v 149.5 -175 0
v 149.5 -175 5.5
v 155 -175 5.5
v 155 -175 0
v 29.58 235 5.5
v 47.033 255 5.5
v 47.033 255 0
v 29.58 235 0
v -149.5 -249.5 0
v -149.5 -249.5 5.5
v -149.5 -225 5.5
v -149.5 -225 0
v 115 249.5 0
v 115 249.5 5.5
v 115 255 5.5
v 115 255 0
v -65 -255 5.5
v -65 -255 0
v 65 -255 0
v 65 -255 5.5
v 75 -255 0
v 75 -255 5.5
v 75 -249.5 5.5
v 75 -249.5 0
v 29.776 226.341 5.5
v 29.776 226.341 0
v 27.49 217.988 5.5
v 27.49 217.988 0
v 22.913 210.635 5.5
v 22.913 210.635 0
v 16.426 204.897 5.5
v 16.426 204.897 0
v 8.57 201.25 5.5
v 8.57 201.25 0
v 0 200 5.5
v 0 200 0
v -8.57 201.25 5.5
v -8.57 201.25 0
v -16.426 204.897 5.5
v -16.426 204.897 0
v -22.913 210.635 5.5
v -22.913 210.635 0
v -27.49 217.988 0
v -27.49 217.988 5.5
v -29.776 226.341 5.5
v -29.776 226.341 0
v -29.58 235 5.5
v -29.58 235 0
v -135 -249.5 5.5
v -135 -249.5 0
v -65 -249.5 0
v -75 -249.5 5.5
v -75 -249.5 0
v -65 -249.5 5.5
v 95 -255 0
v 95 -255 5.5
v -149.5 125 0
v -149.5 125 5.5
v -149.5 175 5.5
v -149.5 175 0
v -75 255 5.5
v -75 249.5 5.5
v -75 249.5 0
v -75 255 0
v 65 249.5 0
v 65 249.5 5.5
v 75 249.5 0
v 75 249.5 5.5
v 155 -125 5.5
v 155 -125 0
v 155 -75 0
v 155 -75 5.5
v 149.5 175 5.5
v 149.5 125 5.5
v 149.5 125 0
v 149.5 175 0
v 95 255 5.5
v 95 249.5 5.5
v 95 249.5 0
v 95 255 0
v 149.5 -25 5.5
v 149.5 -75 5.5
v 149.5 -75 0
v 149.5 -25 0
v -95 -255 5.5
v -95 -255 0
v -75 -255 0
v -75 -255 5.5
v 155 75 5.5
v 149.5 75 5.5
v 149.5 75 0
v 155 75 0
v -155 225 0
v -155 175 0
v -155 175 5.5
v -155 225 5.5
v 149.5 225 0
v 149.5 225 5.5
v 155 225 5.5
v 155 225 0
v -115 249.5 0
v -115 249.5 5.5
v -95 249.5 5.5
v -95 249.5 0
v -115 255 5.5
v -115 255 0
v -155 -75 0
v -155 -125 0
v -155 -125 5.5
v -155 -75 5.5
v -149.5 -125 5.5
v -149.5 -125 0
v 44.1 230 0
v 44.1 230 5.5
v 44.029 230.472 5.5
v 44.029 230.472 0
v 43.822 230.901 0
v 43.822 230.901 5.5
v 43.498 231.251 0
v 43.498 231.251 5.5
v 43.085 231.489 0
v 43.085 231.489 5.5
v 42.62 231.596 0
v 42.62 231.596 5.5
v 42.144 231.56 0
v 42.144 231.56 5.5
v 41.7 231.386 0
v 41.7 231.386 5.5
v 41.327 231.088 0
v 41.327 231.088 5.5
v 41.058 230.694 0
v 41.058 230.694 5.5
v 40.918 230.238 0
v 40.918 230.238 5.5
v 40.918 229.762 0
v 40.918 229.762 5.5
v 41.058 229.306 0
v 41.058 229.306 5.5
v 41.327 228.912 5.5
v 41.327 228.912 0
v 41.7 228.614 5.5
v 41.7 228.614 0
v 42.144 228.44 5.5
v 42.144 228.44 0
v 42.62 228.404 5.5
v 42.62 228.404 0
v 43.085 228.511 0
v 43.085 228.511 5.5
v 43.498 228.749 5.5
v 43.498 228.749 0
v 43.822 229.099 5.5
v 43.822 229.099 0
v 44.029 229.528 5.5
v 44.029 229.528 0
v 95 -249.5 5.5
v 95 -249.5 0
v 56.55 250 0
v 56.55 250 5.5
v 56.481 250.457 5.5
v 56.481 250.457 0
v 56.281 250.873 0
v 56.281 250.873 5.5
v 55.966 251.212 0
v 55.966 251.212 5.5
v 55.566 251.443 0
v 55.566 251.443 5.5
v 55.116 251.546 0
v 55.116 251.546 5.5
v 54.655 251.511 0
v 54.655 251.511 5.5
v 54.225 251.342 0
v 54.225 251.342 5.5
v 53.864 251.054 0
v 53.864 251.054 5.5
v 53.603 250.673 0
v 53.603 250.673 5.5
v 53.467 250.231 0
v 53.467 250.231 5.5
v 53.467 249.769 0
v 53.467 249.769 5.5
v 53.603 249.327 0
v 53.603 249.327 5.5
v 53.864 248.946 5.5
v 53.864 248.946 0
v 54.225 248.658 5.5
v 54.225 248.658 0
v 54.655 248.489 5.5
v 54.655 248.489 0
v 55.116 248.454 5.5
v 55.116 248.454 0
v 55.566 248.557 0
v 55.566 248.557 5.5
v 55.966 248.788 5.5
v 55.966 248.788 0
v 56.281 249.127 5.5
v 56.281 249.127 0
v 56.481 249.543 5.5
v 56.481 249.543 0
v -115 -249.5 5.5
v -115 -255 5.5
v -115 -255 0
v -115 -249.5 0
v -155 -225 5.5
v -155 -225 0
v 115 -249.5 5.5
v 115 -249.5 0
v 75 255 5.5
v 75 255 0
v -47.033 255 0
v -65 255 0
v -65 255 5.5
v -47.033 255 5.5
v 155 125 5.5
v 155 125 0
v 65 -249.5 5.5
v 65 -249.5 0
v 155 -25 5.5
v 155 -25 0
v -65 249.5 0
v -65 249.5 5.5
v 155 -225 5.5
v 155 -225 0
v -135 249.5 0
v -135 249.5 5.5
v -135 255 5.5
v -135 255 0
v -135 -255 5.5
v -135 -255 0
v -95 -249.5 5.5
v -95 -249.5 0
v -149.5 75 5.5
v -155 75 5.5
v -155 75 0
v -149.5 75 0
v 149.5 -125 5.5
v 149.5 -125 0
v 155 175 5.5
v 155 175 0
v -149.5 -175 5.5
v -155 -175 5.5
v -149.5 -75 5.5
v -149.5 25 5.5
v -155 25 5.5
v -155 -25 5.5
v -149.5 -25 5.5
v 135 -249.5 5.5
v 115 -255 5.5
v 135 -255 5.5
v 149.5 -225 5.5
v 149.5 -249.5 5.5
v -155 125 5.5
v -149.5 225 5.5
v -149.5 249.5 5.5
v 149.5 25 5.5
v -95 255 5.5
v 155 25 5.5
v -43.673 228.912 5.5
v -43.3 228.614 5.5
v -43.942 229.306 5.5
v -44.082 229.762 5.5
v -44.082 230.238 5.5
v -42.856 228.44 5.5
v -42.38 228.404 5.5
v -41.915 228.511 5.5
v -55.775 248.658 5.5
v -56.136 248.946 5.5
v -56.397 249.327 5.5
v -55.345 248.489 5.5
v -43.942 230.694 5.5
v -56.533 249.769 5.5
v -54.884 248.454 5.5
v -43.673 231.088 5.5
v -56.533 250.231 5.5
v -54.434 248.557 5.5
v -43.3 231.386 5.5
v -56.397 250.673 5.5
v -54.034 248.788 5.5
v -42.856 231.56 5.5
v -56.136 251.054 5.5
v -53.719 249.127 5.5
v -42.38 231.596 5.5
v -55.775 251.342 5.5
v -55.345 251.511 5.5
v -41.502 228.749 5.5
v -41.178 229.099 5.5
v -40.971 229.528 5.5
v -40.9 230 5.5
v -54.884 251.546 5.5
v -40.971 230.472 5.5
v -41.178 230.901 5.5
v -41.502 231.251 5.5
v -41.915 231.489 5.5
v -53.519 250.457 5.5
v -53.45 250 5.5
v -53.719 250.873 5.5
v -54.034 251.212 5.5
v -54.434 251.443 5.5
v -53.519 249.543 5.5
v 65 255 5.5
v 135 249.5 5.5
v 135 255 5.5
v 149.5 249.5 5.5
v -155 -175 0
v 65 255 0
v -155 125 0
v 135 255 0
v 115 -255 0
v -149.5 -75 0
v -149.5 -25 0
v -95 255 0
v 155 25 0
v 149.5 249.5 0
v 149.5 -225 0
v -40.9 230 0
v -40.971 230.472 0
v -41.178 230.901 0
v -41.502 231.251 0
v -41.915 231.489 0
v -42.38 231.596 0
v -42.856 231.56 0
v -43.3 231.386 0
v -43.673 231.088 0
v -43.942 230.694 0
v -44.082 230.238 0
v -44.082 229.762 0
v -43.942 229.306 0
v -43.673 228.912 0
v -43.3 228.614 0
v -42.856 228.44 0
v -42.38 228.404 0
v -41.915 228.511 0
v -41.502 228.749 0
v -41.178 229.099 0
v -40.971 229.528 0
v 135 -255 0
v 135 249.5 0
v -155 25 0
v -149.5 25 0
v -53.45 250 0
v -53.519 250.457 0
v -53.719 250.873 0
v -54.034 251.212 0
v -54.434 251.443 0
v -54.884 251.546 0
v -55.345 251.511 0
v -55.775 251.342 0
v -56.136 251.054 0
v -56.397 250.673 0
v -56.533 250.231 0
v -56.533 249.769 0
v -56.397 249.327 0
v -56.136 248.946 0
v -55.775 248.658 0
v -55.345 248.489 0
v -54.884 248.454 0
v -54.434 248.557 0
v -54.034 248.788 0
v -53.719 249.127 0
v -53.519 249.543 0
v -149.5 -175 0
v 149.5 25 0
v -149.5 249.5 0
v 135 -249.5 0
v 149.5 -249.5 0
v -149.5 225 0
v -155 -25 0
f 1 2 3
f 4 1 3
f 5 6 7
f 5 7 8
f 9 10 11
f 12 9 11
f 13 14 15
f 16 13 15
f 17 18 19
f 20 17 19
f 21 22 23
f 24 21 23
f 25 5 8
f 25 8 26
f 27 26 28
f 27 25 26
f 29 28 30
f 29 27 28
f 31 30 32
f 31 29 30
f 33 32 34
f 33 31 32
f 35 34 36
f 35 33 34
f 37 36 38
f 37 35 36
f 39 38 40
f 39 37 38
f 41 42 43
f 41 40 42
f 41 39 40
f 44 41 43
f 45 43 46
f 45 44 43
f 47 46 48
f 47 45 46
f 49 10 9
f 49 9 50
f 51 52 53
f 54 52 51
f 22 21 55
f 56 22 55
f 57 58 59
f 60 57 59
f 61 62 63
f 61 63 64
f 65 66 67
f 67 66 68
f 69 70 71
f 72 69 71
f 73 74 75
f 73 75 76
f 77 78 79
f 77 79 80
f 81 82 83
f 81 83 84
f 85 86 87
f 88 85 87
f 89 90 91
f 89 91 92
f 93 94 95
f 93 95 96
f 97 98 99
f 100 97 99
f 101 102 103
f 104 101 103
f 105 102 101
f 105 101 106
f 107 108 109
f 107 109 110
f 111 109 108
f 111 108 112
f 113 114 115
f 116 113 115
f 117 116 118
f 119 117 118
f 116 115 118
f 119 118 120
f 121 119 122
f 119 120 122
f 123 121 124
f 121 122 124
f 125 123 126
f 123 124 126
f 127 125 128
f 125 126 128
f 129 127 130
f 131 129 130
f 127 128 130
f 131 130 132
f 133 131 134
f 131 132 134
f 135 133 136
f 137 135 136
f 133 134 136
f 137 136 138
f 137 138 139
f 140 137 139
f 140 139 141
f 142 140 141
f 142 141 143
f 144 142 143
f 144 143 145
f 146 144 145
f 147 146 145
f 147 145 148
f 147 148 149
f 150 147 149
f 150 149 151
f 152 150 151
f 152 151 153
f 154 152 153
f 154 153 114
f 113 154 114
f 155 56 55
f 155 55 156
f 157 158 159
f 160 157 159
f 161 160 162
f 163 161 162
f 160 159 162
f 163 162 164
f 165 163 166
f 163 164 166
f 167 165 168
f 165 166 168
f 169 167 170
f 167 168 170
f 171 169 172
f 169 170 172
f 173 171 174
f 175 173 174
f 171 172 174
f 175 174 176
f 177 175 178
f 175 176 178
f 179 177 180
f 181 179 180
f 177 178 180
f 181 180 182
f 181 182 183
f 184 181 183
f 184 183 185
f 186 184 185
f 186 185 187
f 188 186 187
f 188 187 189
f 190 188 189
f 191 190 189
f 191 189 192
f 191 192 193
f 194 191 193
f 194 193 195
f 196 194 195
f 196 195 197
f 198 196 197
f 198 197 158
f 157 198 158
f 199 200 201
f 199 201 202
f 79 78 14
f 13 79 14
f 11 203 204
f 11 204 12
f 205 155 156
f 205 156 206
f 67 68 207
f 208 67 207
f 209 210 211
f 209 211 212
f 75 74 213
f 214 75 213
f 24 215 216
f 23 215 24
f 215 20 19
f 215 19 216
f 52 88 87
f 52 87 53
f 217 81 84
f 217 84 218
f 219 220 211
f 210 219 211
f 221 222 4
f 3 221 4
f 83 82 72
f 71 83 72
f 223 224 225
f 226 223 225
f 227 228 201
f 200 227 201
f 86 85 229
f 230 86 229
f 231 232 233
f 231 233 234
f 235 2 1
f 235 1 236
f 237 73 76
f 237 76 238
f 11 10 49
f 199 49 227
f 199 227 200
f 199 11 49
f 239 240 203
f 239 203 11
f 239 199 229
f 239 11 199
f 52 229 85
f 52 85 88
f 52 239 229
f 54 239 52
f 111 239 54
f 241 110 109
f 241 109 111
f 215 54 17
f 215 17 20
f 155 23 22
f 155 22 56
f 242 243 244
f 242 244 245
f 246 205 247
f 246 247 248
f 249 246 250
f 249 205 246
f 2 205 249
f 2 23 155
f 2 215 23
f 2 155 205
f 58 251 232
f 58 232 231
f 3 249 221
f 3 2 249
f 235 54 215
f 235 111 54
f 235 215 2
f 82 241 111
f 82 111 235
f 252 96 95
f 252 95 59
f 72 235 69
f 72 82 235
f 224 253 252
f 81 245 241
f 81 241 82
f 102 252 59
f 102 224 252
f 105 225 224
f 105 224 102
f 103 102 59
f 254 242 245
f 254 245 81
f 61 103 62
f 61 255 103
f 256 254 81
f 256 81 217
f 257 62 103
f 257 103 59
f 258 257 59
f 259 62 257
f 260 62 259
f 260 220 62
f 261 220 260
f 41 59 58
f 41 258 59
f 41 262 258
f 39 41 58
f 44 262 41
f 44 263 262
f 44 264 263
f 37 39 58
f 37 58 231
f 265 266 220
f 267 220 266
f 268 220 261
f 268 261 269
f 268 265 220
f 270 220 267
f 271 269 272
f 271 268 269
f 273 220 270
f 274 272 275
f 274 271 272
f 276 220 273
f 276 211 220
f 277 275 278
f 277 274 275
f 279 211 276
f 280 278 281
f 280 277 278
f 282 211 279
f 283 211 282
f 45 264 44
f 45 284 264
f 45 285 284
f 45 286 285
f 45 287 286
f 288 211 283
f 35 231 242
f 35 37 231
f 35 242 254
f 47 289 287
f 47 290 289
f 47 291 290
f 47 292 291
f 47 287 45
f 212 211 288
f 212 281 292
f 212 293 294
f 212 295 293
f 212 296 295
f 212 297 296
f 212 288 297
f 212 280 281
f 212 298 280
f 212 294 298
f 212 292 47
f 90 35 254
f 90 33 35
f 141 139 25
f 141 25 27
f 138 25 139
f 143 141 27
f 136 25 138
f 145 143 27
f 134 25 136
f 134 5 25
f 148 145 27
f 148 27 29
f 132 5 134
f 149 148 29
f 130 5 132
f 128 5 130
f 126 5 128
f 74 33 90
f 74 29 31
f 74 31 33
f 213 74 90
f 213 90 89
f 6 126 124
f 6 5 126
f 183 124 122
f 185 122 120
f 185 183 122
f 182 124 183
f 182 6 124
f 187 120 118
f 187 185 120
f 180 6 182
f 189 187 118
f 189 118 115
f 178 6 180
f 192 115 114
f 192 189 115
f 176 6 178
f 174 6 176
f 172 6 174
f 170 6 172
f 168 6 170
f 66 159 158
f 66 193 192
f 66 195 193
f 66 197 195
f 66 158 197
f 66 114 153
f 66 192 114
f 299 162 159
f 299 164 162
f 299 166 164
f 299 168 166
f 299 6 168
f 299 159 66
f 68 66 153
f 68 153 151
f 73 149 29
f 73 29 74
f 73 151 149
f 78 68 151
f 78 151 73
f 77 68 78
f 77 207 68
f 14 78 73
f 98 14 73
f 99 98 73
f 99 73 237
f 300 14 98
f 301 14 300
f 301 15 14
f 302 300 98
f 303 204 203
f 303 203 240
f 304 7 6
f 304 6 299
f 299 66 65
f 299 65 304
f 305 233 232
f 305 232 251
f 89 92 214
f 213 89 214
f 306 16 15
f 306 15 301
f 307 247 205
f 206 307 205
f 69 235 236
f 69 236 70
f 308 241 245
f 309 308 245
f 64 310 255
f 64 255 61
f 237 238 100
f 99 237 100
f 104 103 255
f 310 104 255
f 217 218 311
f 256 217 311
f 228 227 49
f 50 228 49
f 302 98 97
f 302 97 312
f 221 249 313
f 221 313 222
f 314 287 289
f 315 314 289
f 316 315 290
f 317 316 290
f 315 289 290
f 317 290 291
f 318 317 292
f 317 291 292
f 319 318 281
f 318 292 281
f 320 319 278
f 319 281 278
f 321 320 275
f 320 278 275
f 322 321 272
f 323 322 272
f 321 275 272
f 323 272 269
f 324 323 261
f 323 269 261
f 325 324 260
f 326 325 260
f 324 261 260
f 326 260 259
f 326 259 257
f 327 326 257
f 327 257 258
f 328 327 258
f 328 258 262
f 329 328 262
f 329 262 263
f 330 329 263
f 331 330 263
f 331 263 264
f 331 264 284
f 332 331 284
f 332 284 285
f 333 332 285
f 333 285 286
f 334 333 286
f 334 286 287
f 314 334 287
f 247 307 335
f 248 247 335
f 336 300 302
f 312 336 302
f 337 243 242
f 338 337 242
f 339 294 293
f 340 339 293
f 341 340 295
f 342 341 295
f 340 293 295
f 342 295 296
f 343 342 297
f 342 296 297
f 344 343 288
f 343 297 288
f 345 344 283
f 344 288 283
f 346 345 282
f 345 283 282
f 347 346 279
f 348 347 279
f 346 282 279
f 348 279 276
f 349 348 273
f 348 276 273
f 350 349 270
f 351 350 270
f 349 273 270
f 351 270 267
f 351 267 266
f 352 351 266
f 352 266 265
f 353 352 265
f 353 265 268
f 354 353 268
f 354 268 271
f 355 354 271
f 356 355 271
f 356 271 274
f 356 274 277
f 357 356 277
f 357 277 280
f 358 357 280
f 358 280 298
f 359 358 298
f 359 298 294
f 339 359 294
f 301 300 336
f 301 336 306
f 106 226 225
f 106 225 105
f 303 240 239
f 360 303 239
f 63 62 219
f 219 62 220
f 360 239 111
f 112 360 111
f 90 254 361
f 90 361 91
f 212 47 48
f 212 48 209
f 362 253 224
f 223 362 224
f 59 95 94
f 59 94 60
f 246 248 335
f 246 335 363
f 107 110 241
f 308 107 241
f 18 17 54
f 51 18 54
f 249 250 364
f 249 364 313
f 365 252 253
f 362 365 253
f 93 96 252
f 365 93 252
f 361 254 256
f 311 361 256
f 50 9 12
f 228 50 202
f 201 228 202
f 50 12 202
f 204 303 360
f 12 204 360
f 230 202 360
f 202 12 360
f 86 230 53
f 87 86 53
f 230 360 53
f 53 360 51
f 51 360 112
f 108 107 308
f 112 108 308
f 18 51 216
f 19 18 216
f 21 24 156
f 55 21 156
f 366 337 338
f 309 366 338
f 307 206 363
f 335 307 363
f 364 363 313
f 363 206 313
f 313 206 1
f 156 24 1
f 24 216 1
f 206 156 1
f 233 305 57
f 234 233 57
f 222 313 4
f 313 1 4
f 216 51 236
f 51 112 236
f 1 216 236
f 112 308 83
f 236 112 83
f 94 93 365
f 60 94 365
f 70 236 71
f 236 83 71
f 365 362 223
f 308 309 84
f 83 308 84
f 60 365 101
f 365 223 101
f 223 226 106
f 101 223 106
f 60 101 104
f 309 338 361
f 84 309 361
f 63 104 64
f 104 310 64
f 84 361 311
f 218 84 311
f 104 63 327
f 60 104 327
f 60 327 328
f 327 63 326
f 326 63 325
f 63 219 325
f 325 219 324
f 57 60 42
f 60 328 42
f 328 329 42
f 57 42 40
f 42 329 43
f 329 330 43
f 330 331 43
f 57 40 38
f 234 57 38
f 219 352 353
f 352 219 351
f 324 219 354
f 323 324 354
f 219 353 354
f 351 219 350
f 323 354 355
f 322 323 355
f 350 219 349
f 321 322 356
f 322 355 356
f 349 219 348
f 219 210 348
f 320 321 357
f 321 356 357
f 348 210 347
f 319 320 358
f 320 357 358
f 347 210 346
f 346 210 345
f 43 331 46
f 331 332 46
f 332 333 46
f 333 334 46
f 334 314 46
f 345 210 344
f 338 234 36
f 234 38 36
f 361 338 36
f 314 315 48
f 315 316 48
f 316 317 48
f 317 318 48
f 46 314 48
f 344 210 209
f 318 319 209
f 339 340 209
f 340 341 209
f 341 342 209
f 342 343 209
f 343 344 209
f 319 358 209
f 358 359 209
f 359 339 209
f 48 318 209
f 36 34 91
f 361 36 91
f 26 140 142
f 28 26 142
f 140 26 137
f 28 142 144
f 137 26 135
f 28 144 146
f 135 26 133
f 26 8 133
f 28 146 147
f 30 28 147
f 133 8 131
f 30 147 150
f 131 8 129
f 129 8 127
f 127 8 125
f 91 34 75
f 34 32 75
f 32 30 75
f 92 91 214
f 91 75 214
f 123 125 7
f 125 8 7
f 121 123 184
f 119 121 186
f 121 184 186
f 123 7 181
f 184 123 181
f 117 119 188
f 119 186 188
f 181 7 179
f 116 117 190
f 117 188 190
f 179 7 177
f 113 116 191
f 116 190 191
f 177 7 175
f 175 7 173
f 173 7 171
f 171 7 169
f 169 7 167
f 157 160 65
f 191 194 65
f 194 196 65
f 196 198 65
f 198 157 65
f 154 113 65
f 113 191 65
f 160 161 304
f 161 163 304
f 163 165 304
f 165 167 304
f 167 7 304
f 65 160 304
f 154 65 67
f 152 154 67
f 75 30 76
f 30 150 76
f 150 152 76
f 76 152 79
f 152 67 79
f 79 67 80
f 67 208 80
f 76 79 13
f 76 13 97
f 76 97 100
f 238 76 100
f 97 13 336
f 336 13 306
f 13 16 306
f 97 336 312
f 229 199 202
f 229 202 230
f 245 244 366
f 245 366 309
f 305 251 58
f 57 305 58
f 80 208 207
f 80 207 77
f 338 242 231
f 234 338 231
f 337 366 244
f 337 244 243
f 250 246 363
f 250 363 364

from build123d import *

# Parameters (mm, degrees)
SKETCH_1_W          = 310
SKETCH_1_H          = 510
EXTRUDE_1_DEPTH     = 5.5
SKETCH_2_W          = 5.5
SKETCH_2_H          = 50
CUT_EXTRUDE_1_DEPTH = 299.463146804
CUT_EXTRUDE_2_DEPTH = 299.463146804
SKETCH_5_R          = 1.6
CUT_EXTRUDE_3_DEPTH = 299.463146804
SKETCH_6_R          = 1.55
CUT_EXTRUDE_4_DEPTH = 299.463146804
SKETCH_7_W          = 20
SKETCH_7_H          = 5.5
SKETCH_7_W_2        = 10
CUT_EXTRUDE_5_DEPTH = 299.463146804


with BuildPart() as part:
    # ｽｹｯﾁ1 → ﾎﾞｽ - 押し出し1 (new body)
    with BuildSketch(Plane.XY):
        Rectangle(SKETCH_1_W, SKETCH_1_H)
    extrude(amount=EXTRUDE_1_DEPTH)

    # ｽｹｯﾁ2 → ｶｯﾄ - 押し出し1 (cut, through all)
    with BuildSketch(Plane.XY.offset(5.5)):
        with Locations((152.25, 50)):
            Rectangle(SKETCH_2_W, SKETCH_2_H)
        with Locations((152.25, -50)):
            Rectangle(SKETCH_2_W, SKETCH_2_H)
        with Locations((152.25, 150)):
            Rectangle(SKETCH_2_W, SKETCH_2_H)
        with Locations((152.25, -150)):
            Rectangle(SKETCH_2_W, SKETCH_2_H)
        with Locations((152.25, 250)):
            Rectangle(SKETCH_2_W, SKETCH_2_H)
        with Locations((152.25, -250)):
            Rectangle(SKETCH_2_W, SKETCH_2_H)
        with Locations((-152.25, 50)):
            Rectangle(SKETCH_2_W, SKETCH_2_H)
        with Locations((-152.25, -50)):
            Rectangle(SKETCH_2_W, SKETCH_2_H)
        with Locations((-152.25, 150)):
            Rectangle(SKETCH_2_W, SKETCH_2_H)
        with Locations((-152.25, -150)):
            Rectangle(SKETCH_2_W, SKETCH_2_H)
        with Locations((-152.25, 250)):
            Rectangle(SKETCH_2_W, SKETCH_2_H)
        with Locations((-152.25, -250)):
            Rectangle(SKETCH_2_W, SKETCH_2_H)
    extrude(amount=-CUT_EXTRUDE_1_DEPTH, mode=Mode.SUBTRACT)

    # ｽｹｯﾁ3 → ｶｯﾄ - 押し出し2 (cut, through all)
    with BuildSketch(Plane.XY.offset(5.5)):
        with BuildLine():
            Line((47.033321686, 255), (29.580398915, 235))
            ThreePointArc((29.580398915, 235), (0, 200), (-29.580398915, 235))
            Line((-29.580398915, 235), (-47.033321686, 255))
            Line((-47.033321686, 255), (47.033321686, 255))
        make_face()
    extrude(amount=-CUT_EXTRUDE_2_DEPTH, mode=Mode.SUBTRACT)

    # ｽｹｯﾁ5 → ｶｯﾄ - 押し出し3 (cut, through all)
    with BuildSketch(Plane.XY.offset(5.5)):
        with Locations((-42.5, 230)):
            Circle(SKETCH_5_R)
        with Locations((42.5, 230)):
            Circle(SKETCH_5_R)
    extrude(amount=-CUT_EXTRUDE_3_DEPTH, mode=Mode.SUBTRACT)

    # ｽｹｯﾁ6 → ｶｯﾄ - 押し出し4 (cut, through all)
    with BuildSketch(Plane.XY.offset(5.5)):
        with Locations((55, 250)):
            Circle(SKETCH_6_R)
        with Locations((-55, 250)):
            Circle(SKETCH_6_R)
    extrude(amount=-CUT_EXTRUDE_4_DEPTH, mode=Mode.SUBTRACT)

    # ｽｹｯﾁ7 → ｶｯﾄ - 押し出し5 (cut, through all)
    with BuildSketch(Plane.XY.offset(5.5)):
        with Locations((145, 252.25)):
            Rectangle(SKETCH_7_W, SKETCH_7_H)
        with Locations((105, 252.25)):
            Rectangle(SKETCH_7_W, SKETCH_7_H)
        with Locations((70, 252.25)):
            Rectangle(SKETCH_7_W_2, SKETCH_7_H)
        with Locations((-70, 252.25)):
            Rectangle(SKETCH_7_W_2, SKETCH_7_H)
        with Locations((-105, 252.25)):
            Rectangle(SKETCH_7_W, SKETCH_7_H)
        with Locations((-145, 252.25)):
            Rectangle(SKETCH_7_W, SKETCH_7_H)
        with Locations((-145, -252.25)):
            Rectangle(SKETCH_7_W, SKETCH_7_H)
        with Locations((-105, -252.25)):
            Rectangle(SKETCH_7_W, SKETCH_7_H)
        with Locations((-70, -252.25)):
            Rectangle(SKETCH_7_W_2, SKETCH_7_H)
        with Locations((70, -252.25)):
            Rectangle(SKETCH_7_W_2, SKETCH_7_H)
        with Locations((105, -252.25)):
            Rectangle(SKETCH_7_W, SKETCH_7_H)
        with Locations((145, -252.25)):
            Rectangle(SKETCH_7_W, SKETCH_7_H)
    extrude(amount=-CUT_EXTRUDE_5_DEPTH, mode=Mode.SUBTRACT)


solid = part.part
